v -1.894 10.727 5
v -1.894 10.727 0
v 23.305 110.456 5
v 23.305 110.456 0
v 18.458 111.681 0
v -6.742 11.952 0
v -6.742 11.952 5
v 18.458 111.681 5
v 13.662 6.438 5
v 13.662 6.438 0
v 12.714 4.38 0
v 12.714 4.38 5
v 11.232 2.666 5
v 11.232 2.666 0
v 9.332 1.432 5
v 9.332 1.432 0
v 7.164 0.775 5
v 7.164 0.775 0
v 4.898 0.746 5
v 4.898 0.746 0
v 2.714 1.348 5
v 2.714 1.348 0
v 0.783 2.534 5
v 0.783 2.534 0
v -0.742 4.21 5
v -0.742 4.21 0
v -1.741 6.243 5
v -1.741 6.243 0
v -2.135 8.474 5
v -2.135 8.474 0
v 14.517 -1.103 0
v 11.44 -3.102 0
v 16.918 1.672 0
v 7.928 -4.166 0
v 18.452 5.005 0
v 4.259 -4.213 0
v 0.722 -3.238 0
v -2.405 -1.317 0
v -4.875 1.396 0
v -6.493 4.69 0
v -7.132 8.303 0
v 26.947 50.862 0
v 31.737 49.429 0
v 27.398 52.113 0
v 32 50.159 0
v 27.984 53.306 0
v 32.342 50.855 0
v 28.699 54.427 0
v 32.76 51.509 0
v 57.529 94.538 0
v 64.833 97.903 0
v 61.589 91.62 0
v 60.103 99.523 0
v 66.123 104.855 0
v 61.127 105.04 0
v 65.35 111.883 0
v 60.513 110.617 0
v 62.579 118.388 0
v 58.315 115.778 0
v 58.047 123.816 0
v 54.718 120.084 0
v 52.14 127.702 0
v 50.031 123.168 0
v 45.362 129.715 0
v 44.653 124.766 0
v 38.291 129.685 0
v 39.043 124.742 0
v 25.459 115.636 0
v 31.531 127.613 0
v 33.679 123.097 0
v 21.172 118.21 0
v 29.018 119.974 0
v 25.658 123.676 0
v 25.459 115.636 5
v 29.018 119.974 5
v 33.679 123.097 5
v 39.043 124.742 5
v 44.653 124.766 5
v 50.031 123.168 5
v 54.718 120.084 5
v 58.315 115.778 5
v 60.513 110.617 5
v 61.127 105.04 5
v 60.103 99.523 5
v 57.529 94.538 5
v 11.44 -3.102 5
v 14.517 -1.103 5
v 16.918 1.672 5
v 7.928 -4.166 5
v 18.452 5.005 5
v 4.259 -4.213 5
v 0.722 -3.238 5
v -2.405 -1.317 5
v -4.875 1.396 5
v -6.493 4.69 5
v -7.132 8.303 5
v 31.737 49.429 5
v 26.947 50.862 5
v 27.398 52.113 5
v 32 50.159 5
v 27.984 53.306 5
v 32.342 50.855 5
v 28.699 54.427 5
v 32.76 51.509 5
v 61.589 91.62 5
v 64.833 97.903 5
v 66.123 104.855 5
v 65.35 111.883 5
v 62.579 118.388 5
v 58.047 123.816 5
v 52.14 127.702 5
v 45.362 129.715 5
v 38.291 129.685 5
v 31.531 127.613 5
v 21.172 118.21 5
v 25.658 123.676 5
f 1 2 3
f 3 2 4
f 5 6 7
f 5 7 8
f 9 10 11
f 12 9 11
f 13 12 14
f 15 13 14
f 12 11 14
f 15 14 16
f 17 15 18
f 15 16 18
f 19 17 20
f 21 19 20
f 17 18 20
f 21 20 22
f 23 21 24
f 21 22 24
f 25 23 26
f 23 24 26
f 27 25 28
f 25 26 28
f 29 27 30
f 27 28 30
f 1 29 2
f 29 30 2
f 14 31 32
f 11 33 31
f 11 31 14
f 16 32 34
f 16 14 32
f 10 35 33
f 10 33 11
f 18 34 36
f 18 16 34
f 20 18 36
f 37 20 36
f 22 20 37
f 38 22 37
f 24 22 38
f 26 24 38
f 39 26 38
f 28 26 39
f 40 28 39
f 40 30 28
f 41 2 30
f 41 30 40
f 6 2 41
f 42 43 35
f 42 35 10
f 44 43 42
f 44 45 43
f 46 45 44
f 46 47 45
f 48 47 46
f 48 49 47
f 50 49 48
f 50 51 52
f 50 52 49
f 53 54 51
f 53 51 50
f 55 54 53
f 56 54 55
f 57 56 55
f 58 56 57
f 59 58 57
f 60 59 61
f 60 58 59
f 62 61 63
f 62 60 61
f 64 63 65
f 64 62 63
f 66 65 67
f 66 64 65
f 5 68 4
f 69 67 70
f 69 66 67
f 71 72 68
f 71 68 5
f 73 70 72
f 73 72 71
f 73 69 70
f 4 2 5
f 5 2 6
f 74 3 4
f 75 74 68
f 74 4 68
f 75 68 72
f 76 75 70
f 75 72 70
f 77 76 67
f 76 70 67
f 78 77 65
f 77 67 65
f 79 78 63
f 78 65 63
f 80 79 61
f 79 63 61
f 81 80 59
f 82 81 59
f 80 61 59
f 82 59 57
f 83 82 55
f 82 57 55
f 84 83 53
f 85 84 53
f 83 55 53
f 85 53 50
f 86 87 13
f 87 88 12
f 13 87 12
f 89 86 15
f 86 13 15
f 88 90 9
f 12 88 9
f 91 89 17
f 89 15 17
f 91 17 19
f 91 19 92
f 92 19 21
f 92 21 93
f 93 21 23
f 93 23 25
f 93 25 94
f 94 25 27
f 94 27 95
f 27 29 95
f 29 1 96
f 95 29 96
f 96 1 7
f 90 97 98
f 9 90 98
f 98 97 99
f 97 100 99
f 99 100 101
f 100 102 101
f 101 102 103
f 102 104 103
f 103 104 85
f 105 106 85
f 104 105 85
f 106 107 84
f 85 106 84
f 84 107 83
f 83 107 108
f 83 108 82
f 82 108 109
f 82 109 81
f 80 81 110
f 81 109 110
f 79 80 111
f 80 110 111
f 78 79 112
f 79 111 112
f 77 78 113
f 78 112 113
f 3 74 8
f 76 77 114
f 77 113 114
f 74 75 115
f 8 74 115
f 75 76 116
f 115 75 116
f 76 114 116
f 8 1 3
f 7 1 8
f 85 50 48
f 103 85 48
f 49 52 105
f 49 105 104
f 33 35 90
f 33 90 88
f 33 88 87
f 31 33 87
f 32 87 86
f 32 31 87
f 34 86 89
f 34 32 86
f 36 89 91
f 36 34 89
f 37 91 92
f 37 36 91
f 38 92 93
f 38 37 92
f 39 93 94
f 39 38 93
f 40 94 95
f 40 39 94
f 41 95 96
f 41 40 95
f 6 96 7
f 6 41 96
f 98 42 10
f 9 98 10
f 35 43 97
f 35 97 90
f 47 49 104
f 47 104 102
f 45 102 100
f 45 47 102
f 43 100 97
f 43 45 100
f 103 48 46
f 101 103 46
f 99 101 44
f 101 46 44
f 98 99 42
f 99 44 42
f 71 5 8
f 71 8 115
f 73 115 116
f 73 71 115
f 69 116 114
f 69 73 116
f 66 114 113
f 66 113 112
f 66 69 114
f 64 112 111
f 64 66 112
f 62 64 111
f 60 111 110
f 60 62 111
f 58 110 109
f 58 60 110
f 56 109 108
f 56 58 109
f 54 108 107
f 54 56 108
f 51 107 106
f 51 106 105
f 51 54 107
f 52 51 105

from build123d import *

# Parameters (mm, degrees)
EXTRUDE_THIN1_DEPTH = 5


with BuildPart() as part:
    # Sketch2 → Extrude-Thin1 (new body)
    with BuildSketch(Plane.XY):
        with BuildLine():
            Line((31.737189524, 49.429256179), (18.452031438, 5.005116936))
            ThreePointArc((18.452031438, 5.005116936), (2.455857834, -3.849946484), (-6.741752404, 11.951752286))
            Line((-6.741752404, 11.951752286), (18.457702948, 111.680824527))
            ThreePointArc((18.457702948, 111.680824527), (52.139902973, 127.701671453), (61.588984186, 91.620194226))
            Line((61.588984186, 91.620194226), (32.759580087, 51.509058335))
            ThreePointArc((32.759580087, 51.509058335), (32.16171614, 50.511761899), (31.737189524, 49.429256179))
        make_face()
        with BuildLine():
            Line((26.946810916, 50.86183176), (13.66165283, 6.437692517))
            ThreePointArc((13.66165283, 6.437692517), (3.784902946, 0.97018205), (-1.894111179, 10.726854512))
            Line((-1.894111179, 10.726854512), (23.305344172, 110.455926753))
            ThreePointArc((23.305344172, 110.455926753), (50.031286447, 123.168048581), (57.528884552, 94.538342776))
            Line((57.528884552, 94.538342776), (28.699480452, 54.427206885))
            ThreePointArc((28.699480452, 54.427206885), (27.674570829, 52.717555851), (26.946810916, 50.86183176))
        make_face(mode=Mode.SUBTRACT)
    extrude(amount=EXTRUDE_THIN1_DEPTH)


solid = part.part
